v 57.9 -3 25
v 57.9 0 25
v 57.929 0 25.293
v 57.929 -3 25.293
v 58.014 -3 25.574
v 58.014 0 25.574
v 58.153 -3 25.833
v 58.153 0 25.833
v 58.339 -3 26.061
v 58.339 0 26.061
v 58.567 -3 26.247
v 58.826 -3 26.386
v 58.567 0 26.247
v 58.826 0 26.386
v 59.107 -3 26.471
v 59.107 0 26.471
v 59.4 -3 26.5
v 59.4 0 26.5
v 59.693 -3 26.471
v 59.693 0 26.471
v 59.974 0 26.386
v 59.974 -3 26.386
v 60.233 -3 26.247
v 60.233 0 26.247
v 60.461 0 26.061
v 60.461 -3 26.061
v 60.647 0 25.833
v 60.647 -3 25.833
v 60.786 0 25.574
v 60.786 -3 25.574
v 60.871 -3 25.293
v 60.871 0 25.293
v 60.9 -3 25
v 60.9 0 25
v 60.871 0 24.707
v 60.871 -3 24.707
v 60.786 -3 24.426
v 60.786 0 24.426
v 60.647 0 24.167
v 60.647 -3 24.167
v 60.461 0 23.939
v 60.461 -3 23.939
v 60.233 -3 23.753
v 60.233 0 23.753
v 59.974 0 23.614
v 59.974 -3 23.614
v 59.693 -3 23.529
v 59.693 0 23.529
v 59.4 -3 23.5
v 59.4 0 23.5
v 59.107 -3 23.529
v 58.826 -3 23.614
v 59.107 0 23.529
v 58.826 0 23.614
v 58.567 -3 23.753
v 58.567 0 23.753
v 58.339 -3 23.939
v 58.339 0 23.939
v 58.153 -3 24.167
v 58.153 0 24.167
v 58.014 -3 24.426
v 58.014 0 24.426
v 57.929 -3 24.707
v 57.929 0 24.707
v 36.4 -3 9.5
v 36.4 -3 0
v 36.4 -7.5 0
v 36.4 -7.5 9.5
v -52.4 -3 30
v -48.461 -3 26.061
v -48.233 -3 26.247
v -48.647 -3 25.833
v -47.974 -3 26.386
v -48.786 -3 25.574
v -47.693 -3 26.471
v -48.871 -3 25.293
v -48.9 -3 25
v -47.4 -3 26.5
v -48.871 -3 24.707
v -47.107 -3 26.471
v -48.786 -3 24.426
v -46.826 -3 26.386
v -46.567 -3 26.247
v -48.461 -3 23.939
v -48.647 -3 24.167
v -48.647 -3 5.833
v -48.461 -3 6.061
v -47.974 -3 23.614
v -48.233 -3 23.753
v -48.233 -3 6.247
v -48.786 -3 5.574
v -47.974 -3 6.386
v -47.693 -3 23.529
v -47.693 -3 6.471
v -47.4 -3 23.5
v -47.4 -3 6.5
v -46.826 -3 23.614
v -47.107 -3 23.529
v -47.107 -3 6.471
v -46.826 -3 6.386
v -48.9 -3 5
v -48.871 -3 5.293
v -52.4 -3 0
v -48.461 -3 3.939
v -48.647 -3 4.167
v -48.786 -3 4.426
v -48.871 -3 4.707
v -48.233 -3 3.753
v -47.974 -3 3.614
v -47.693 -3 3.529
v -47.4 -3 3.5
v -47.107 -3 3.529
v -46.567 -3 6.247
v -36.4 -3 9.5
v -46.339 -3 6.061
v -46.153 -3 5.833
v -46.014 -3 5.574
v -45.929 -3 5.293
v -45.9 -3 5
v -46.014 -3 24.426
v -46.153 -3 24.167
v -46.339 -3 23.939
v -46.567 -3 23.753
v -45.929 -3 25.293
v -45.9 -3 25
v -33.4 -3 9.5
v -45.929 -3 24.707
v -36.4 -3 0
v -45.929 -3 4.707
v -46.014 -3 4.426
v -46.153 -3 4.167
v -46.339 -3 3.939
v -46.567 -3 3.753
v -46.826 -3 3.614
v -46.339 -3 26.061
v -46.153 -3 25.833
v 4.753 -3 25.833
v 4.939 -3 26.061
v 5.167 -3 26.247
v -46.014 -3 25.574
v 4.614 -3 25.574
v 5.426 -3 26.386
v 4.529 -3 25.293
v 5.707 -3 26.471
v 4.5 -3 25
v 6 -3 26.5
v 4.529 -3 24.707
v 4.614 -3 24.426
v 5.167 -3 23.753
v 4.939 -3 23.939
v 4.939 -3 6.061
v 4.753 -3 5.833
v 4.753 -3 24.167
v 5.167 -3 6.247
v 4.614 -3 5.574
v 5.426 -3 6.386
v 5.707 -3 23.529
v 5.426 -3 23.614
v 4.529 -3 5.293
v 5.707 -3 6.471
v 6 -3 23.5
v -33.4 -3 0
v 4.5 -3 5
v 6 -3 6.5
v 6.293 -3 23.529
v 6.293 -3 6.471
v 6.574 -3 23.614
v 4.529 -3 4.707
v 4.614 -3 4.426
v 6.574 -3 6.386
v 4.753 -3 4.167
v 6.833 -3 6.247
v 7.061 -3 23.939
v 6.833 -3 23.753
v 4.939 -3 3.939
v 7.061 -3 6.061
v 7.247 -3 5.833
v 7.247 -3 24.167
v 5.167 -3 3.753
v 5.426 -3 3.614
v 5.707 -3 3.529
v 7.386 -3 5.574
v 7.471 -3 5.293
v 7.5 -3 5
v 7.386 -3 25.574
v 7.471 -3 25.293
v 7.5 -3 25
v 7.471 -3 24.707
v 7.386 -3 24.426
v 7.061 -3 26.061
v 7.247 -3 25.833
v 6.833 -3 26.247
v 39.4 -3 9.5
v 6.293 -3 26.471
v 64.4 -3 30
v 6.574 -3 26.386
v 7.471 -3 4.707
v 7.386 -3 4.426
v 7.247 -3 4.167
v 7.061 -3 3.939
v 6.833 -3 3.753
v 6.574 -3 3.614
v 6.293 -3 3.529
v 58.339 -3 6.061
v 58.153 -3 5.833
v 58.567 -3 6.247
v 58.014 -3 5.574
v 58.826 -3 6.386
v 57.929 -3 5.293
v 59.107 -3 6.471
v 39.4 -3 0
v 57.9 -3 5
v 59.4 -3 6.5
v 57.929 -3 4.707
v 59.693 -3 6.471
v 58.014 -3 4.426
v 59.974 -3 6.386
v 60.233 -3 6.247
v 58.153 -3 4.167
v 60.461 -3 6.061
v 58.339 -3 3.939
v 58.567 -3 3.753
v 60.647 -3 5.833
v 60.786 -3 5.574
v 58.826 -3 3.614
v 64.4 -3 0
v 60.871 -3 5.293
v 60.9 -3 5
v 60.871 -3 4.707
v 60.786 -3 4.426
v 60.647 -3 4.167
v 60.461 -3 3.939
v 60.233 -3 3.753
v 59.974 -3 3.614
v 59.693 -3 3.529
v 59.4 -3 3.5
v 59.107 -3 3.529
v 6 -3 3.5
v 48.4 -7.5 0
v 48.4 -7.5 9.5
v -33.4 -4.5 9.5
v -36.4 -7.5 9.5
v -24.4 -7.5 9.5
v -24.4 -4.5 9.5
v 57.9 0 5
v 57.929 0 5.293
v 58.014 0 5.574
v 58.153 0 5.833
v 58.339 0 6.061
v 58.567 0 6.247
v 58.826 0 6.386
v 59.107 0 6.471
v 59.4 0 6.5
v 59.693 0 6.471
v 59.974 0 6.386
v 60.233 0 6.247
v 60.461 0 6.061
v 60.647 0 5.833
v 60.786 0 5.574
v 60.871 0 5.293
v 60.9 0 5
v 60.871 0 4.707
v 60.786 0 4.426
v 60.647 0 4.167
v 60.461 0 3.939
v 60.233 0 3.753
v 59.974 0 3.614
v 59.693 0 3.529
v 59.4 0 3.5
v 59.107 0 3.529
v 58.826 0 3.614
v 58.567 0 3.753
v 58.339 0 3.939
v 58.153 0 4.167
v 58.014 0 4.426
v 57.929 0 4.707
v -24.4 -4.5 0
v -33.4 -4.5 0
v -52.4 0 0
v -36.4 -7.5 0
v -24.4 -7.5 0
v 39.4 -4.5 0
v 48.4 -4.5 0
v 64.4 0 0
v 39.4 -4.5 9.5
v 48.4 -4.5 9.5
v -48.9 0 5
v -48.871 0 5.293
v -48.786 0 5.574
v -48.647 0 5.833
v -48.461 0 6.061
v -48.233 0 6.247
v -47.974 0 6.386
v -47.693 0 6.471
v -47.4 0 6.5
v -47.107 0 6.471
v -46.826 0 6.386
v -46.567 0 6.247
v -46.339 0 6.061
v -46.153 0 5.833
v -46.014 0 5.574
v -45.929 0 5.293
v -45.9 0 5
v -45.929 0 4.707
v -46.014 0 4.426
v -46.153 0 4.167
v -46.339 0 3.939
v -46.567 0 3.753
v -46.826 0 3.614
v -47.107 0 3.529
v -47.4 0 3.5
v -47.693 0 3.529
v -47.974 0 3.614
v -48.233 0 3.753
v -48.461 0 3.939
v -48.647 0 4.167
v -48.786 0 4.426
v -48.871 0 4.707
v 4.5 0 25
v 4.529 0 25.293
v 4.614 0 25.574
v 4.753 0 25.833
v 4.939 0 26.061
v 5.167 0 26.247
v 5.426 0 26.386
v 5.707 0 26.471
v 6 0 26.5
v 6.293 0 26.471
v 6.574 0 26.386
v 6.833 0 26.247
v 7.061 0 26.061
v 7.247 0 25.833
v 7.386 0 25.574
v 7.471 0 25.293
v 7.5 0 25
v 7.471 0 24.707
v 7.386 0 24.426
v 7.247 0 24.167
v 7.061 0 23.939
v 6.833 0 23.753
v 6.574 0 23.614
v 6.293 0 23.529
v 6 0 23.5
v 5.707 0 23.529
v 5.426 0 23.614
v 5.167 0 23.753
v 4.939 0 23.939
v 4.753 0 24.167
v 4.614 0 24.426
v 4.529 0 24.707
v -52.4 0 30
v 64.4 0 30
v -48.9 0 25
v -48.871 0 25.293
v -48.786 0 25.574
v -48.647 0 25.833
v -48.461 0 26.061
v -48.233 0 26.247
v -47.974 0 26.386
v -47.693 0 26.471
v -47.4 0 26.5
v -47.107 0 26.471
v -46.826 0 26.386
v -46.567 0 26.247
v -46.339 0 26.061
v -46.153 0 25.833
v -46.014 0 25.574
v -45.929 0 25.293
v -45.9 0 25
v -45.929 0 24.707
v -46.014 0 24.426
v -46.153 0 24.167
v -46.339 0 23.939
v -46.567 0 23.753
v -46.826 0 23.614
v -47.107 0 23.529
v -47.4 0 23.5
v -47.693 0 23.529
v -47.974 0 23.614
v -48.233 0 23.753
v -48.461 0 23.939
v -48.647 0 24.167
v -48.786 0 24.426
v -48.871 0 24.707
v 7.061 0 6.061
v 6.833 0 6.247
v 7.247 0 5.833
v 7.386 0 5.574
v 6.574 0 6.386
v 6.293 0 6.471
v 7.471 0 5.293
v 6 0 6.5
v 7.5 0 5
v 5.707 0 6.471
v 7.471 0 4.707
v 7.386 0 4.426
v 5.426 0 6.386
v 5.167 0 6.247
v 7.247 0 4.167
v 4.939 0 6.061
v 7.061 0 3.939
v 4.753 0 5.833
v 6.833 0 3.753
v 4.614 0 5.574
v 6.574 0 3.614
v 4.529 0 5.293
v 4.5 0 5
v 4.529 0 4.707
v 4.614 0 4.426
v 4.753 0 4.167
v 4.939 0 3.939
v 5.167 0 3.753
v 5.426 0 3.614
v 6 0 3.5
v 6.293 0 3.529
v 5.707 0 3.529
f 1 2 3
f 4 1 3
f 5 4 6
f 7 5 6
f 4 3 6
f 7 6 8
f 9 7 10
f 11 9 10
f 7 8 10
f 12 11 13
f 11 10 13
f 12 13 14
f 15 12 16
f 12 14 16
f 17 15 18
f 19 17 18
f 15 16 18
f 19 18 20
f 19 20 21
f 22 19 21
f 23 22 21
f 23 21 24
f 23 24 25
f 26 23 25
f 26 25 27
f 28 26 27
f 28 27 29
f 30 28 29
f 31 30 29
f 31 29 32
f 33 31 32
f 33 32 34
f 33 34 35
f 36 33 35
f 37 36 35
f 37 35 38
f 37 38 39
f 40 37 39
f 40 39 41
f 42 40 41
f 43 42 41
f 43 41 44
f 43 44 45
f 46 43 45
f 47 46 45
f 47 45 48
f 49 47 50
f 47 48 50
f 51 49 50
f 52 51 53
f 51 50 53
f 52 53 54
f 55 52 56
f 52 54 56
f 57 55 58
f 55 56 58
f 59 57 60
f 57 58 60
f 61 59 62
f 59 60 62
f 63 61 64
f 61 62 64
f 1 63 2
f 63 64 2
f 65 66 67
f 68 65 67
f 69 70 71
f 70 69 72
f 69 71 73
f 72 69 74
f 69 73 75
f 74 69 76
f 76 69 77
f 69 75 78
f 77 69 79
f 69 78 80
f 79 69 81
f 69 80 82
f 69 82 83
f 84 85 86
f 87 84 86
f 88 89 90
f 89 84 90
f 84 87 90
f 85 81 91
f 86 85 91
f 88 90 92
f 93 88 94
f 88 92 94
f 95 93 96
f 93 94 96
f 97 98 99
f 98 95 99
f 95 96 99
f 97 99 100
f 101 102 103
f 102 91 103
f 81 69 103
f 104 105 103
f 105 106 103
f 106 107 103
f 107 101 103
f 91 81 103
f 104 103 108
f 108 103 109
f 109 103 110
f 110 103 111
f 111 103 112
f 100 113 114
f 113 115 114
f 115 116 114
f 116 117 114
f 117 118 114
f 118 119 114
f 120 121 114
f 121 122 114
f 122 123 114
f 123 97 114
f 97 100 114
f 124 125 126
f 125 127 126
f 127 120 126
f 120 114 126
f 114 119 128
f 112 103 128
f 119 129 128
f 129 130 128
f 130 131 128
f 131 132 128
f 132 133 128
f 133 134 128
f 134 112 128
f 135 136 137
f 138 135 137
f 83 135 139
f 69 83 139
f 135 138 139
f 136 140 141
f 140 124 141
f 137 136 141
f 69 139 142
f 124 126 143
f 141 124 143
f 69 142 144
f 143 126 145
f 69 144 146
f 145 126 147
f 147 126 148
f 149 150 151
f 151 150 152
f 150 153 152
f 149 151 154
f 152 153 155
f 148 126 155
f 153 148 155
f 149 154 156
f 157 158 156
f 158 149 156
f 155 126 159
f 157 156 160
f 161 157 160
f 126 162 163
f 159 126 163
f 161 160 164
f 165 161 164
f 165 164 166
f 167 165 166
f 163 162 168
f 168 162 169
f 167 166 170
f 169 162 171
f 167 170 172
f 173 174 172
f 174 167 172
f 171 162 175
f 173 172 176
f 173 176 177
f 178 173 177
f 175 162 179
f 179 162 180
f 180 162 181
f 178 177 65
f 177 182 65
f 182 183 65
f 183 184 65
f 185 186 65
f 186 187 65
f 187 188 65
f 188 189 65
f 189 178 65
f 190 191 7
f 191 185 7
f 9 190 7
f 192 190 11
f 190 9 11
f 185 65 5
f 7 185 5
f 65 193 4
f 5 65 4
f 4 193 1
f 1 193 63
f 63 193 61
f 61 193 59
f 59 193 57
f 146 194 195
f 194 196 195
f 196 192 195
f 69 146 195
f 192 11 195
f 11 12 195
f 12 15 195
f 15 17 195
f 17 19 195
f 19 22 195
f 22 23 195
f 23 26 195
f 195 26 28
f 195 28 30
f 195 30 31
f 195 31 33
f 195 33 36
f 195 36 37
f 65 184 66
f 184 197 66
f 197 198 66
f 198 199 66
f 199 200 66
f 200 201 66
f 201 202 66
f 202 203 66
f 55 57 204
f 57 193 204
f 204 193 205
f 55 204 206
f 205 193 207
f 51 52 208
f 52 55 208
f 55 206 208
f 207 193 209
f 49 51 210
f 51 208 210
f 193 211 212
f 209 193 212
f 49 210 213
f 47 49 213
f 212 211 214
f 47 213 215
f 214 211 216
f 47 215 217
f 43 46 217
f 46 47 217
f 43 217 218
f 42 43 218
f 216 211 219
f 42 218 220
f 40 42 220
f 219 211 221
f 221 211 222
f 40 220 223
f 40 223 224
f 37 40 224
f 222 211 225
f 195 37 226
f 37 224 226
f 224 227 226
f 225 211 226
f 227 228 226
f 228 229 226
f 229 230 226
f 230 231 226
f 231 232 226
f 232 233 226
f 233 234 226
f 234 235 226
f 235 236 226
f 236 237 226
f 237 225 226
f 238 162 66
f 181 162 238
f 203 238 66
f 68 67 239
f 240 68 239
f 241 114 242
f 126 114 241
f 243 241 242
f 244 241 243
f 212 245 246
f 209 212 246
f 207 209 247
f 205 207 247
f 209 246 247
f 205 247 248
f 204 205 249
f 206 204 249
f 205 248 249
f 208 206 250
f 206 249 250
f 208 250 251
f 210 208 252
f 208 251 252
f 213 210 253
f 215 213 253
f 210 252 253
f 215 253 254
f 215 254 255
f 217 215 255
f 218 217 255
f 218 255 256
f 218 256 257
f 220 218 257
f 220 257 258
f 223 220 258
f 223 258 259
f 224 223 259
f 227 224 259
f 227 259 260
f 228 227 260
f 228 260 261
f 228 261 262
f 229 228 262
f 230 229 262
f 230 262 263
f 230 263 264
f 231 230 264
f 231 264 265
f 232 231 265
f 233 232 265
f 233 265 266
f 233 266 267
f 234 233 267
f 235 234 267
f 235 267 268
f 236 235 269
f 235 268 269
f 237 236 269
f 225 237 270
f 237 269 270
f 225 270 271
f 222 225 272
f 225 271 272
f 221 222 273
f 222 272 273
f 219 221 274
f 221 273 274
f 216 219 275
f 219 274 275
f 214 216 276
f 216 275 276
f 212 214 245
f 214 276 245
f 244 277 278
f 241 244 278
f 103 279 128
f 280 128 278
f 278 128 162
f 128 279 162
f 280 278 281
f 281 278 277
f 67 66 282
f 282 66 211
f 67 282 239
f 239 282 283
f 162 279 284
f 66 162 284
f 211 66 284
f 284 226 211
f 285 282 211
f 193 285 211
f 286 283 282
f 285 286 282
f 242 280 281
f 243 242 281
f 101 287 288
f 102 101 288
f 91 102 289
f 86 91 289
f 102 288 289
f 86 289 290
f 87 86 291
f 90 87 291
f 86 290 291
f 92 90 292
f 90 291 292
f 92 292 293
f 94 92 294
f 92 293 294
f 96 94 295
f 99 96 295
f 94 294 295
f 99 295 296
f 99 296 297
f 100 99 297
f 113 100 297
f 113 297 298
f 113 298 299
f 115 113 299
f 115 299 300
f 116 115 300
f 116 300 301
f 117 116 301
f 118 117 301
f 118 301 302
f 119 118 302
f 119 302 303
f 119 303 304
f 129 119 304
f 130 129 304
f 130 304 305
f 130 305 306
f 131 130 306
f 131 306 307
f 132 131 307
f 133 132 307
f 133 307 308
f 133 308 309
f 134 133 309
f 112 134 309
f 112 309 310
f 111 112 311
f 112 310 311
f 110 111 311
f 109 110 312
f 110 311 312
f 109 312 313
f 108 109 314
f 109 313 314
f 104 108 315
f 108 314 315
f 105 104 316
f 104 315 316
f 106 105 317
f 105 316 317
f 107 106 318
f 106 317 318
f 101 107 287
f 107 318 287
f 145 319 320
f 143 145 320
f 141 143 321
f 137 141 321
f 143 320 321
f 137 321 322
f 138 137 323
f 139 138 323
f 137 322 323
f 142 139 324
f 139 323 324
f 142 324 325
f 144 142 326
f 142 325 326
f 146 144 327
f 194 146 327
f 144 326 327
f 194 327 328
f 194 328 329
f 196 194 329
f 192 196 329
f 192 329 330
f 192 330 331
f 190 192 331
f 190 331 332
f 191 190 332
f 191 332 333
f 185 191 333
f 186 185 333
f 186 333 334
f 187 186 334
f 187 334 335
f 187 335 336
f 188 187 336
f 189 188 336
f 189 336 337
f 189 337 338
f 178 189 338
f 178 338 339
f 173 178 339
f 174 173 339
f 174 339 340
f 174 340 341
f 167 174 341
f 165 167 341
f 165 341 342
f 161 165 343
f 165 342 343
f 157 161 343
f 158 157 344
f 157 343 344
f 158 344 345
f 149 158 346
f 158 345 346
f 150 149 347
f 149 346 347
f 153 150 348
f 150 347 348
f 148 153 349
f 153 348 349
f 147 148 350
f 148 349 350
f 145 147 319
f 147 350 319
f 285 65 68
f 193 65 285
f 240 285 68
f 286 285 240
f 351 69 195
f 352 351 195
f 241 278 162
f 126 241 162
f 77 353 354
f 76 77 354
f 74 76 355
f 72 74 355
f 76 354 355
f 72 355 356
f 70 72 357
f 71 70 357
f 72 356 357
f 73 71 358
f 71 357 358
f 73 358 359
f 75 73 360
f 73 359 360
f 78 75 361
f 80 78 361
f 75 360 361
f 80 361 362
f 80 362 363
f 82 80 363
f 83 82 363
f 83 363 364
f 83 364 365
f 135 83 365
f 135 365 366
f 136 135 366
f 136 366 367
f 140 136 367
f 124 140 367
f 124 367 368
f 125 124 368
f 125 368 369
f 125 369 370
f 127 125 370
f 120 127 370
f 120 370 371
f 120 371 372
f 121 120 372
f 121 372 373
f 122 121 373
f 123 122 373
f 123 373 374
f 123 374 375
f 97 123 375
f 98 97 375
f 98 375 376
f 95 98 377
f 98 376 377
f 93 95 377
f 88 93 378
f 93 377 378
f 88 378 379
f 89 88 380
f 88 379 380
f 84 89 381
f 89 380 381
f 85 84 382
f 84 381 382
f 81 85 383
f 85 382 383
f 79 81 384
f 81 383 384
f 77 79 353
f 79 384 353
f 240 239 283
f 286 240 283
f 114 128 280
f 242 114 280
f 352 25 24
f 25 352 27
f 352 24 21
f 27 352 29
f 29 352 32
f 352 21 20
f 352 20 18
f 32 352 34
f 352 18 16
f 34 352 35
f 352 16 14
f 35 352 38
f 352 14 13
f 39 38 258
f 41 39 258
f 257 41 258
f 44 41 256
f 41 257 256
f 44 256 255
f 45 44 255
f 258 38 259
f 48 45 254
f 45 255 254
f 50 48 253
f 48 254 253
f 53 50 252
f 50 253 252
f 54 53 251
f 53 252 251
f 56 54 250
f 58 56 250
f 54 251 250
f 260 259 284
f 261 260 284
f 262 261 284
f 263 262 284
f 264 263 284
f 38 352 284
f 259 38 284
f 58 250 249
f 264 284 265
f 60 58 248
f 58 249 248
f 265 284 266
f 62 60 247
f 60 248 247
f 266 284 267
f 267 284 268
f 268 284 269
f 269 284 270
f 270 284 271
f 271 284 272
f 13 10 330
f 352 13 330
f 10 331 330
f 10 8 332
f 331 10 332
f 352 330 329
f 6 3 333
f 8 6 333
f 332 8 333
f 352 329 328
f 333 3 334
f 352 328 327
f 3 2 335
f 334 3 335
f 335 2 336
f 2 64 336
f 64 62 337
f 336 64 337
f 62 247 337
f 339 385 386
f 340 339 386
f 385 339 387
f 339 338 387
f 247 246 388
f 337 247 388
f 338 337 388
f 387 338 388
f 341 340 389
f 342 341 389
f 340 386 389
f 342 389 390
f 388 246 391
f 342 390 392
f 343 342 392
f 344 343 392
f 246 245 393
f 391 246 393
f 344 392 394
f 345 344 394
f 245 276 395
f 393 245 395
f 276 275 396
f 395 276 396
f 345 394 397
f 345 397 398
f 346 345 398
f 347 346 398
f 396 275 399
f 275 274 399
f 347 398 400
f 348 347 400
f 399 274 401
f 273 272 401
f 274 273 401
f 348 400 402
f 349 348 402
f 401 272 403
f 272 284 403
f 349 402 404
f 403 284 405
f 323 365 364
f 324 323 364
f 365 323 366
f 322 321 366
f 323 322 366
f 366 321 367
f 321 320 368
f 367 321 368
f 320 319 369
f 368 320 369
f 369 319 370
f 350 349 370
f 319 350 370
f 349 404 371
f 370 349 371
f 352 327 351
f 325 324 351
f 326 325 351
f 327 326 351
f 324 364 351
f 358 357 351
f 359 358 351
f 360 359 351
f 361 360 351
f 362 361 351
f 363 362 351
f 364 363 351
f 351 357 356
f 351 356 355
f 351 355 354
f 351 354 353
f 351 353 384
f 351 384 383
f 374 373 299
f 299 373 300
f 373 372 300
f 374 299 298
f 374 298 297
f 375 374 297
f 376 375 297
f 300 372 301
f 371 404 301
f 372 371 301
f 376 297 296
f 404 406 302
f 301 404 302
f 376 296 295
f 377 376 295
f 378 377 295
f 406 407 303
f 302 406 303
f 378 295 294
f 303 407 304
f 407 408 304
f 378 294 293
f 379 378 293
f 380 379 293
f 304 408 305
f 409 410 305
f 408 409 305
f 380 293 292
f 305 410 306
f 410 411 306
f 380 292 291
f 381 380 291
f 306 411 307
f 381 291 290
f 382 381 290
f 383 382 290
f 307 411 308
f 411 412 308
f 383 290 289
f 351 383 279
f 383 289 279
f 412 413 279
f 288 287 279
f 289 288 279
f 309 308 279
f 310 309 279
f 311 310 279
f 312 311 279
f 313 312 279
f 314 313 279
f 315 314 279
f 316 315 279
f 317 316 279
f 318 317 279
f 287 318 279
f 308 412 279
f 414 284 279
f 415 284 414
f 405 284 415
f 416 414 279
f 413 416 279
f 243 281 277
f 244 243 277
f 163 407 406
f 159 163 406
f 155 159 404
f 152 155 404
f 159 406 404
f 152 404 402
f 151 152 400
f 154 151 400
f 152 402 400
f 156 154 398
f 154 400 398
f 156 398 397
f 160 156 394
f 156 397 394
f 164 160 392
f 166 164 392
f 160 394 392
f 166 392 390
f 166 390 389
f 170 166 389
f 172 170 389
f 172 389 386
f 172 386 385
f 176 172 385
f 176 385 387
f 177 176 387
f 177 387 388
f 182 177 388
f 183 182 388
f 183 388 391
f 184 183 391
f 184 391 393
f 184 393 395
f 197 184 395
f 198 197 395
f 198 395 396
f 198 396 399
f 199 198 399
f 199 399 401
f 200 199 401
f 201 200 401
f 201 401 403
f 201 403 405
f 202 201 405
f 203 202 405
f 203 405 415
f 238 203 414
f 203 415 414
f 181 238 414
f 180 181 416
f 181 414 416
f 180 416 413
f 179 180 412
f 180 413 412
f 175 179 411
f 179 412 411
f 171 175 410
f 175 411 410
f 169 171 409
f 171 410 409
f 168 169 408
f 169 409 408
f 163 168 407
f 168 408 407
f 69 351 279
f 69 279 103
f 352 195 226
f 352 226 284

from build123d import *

# Parameters (mm, degrees)
F1_DEPTH = 9.5
F2_W     = 116.8
F2_H     = 3
F3_DEPTH = 30
F4_R     = 1.5
F5_DEPTH = 25


with BuildPart() as f1:
    # F0 (on Top) → F1 (new body)
    with BuildSketch(Plane.XY):
        Polygon((0, 0), (-24.4, 0), (-36.4, 0), (-52.4, 0), (-52.4, -3), (-36.4, -3), (-36.4, -7.5), (-24.4, -7.5), (-24.4, -4.5), (-33.4, -4.5), (-33.4, -3), (-24.4, -3), (0, -3), align=None)
        Polygon((36.4, 0), (0, 0), (0, -3), (36.4, -3), (36.4, -7.5), (48.4, -7.5), (48.4, -4.5), (39.4, -4.5), (39.4, -3), (48.4, -3), (64.4, -3), (64.4, 0), (48.4, 0), align=None)
    extrude(amount=F1_DEPTH)

    # F2 (on face) → F3 (join)
    with BuildSketch(Plane(origin=(0, 0, 0), x_dir=(1, 0, 0), z_dir=(0, 0, -1))):
        with Locations((6, 1.5)):
            Rectangle(F2_W, F2_H)
    extrude(amount=-F3_DEPTH)

    # F4 (on face) → F5 (cut)
    with BuildSketch(Plane(origin=(0, 0, 0), x_dir=(-1, 0, 0), z_dir=(0, 1, 0))):
        with Locations((47.4, 25)):
            Circle(F4_R)
        with Locations((-59.4, 25)):
            Circle(F4_R)
        with Locations((-59.4, 5)):
            Circle(F4_R)
        with Locations((47.4, 5)):
            Circle(F4_R)
        with Locations((-6, 25)):
            Circle(F4_R)
        with Locations((-6, 5)):
            Circle(F4_R)
    extrude(amount=-F5_DEPTH, mode=Mode.SUBTRACT)


solid = f1.part
